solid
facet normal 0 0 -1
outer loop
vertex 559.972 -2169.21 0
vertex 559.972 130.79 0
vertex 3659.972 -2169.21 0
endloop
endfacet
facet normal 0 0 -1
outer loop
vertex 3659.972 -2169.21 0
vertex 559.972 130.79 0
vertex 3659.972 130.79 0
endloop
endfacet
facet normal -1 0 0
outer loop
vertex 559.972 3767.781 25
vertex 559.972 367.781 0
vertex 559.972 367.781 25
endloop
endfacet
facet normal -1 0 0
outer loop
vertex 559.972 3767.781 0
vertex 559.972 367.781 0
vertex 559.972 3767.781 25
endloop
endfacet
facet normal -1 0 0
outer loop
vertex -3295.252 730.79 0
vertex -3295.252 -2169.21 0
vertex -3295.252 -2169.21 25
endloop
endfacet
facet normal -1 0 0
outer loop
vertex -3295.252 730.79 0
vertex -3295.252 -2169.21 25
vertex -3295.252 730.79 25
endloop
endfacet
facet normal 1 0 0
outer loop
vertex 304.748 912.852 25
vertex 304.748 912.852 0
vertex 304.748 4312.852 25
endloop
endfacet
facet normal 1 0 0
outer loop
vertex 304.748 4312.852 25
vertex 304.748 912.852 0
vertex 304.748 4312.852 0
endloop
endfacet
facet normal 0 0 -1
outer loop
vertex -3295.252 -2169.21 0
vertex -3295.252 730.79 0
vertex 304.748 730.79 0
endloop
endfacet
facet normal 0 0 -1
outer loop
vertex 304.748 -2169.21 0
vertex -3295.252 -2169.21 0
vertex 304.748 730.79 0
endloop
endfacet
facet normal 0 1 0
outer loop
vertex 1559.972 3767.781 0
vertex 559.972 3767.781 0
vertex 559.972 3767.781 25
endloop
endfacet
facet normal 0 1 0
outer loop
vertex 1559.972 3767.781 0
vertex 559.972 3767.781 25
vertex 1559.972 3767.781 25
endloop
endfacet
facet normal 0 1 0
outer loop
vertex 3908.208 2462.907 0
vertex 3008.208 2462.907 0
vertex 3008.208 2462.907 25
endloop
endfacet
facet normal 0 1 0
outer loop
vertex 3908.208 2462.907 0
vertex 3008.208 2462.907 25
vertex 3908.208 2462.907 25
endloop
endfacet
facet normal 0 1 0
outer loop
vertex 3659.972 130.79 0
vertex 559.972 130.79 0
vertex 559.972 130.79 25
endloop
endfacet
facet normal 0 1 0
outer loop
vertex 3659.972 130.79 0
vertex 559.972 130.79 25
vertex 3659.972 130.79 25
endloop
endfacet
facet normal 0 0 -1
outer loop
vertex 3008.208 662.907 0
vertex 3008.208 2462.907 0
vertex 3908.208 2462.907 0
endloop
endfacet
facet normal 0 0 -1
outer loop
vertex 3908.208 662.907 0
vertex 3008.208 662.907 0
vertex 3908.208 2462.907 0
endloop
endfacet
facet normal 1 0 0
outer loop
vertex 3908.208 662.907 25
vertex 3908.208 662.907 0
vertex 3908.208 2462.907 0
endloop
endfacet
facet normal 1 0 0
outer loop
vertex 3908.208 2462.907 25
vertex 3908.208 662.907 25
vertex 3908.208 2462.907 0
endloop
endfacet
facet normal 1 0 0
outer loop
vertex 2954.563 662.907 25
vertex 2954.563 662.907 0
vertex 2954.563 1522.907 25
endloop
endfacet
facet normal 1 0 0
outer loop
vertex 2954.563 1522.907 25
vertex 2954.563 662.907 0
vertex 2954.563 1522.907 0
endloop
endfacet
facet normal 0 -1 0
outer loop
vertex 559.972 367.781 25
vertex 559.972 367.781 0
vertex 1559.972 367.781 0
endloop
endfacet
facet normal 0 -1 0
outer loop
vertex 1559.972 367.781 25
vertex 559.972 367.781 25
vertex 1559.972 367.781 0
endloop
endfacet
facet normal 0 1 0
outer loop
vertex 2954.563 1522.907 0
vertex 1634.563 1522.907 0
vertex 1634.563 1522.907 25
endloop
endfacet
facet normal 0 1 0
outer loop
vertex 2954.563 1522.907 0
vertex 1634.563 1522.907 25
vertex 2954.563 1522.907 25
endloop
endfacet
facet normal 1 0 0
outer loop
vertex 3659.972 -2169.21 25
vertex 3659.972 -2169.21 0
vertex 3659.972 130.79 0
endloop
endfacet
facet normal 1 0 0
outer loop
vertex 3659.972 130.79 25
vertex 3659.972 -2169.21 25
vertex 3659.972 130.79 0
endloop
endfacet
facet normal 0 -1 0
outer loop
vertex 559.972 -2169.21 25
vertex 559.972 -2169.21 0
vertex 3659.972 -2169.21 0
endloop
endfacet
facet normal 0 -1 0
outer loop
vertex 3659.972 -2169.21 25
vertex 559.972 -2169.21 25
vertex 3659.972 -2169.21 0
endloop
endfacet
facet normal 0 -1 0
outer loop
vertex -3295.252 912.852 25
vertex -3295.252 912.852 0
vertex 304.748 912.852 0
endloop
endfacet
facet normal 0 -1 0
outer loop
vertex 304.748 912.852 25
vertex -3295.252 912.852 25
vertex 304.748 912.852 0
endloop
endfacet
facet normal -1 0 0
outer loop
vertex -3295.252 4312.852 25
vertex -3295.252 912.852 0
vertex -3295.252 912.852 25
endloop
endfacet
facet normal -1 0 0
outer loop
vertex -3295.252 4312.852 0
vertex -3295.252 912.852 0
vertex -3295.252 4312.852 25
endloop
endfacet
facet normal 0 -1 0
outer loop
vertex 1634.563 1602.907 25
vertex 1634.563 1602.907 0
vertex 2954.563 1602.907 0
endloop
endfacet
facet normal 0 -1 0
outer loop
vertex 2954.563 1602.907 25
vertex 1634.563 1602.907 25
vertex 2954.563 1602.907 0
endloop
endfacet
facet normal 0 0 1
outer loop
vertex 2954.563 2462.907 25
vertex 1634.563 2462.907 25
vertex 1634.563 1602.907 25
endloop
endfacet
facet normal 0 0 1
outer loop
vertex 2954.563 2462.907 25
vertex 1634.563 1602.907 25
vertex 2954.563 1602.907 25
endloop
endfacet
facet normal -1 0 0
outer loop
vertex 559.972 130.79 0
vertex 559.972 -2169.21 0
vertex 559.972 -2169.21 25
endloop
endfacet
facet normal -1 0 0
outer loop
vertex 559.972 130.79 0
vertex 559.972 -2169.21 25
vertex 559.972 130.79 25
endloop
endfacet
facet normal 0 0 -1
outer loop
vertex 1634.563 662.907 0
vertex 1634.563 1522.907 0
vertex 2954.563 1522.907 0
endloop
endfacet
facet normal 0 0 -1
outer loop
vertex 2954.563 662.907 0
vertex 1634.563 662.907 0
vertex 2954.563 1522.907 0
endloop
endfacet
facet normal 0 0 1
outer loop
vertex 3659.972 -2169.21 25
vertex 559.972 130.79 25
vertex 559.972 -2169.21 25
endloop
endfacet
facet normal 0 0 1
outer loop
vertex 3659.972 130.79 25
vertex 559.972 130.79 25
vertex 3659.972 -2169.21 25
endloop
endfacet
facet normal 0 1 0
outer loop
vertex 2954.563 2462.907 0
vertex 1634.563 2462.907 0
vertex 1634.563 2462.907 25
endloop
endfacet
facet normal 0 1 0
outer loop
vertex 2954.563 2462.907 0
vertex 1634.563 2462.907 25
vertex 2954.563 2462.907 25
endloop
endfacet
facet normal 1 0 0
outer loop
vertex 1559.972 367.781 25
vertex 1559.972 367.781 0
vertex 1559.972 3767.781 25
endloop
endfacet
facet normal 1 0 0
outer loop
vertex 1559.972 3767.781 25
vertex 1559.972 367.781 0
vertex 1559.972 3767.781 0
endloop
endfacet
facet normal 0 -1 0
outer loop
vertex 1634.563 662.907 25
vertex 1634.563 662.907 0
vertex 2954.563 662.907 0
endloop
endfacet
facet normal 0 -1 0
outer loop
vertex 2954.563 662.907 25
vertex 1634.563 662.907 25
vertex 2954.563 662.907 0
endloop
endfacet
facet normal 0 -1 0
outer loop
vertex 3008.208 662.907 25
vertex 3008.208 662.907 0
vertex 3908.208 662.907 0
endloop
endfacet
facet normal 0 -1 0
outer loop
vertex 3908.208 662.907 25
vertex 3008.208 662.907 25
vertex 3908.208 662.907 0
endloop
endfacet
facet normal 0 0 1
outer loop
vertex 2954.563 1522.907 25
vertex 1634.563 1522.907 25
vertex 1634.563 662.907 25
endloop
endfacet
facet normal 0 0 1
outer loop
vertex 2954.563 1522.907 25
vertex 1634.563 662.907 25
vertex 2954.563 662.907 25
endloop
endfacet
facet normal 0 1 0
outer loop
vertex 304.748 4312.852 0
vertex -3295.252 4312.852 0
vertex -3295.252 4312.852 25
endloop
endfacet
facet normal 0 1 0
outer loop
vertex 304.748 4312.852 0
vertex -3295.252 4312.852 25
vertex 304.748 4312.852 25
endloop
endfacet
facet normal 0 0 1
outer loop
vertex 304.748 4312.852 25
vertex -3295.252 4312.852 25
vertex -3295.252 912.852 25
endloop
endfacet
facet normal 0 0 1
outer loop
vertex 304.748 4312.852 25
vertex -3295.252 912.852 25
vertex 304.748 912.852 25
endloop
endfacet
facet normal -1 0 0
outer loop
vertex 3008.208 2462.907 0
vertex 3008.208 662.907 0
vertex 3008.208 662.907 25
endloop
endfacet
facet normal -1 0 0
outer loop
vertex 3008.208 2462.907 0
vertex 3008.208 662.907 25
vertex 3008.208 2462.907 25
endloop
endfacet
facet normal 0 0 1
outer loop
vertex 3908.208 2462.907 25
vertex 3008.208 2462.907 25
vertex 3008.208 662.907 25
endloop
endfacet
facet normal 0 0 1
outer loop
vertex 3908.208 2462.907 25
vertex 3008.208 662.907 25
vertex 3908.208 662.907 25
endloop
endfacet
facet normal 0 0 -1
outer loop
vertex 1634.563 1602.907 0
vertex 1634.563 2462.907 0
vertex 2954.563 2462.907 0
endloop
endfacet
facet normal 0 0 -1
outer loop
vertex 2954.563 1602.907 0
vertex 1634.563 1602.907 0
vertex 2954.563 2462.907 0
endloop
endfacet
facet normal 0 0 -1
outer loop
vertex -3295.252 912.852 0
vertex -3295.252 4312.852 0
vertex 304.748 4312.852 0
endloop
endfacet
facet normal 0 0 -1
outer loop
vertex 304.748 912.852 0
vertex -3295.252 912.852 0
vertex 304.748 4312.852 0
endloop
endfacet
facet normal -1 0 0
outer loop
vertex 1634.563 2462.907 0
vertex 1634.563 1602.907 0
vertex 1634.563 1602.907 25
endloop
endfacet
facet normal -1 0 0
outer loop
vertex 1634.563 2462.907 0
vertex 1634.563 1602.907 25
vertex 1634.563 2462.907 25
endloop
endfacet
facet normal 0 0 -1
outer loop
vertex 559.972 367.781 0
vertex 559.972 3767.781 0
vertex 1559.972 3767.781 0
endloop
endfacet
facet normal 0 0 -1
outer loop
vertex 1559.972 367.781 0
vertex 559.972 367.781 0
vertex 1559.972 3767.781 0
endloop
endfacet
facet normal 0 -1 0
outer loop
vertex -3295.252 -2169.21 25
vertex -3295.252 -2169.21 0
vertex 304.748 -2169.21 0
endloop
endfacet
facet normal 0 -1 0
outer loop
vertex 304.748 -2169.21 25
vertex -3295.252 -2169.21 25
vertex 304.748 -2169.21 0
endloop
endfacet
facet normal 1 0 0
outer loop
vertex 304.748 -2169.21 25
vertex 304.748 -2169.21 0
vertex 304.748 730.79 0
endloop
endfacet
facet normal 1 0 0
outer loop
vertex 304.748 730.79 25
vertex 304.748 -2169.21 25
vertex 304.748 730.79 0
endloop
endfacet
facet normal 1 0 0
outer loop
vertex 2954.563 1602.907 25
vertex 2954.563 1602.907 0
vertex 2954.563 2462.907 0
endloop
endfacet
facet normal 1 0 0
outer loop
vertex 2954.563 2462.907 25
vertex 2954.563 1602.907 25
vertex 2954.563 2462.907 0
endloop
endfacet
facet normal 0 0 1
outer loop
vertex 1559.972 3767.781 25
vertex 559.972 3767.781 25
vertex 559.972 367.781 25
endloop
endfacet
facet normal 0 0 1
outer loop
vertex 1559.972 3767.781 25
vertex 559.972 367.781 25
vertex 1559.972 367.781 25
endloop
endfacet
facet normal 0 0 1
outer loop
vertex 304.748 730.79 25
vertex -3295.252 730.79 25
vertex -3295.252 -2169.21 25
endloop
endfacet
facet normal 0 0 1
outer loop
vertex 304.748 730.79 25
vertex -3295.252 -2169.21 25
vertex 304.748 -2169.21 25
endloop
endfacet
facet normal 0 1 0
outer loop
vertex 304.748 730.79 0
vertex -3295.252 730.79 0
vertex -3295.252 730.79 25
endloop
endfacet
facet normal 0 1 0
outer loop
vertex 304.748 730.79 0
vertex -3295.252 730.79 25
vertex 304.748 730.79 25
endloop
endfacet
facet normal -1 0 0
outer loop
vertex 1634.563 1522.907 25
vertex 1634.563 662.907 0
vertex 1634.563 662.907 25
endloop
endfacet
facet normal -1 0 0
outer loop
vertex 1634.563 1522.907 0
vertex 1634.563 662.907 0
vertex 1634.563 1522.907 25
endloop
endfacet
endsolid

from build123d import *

# Parameters (mm, degrees)
F0_W     = 3600
F0_H     = 3400
F0_H_2   = 2900
F0_W_2   = 1000
F0_W_3   = 3100
F0_H_3   = 2300
F0_W_4   = 1320
F0_H_4   = 860
F0_W_5   = 900
F0_H_5   = 1800
F1_DEPTH = 25


with BuildPart() as f1:
    # F0 (on Top) → F1 (new body)
    with BuildSketch(Plane.XY):
        with Locations((-1495.252092, 2612.852145)):
            Rectangle(F0_W, F0_H)
        with Locations((-1495.252092, -719.210047)):
            Rectangle(F0_W, F0_H_2)
        with Locations((1059.9719, 2067.780676)):
            Rectangle(F0_W_2, F0_H)
        with Locations((2109.9719, -1019.210047)):
            Rectangle(F0_W_3, F0_H_3)
        with Locations((2294.563088, 2032.907422)):
            Rectangle(F0_W_4, F0_H_4)
        with Locations((2294.563088, 1092.907422)):
            Rectangle(F0_W_4, F0_H_4)
        with Locations((3458.208275, 1562.907422)):
            Rectangle(F0_W_5, F0_H_5)
    extrude(amount=F1_DEPTH)


solid = f1.part
